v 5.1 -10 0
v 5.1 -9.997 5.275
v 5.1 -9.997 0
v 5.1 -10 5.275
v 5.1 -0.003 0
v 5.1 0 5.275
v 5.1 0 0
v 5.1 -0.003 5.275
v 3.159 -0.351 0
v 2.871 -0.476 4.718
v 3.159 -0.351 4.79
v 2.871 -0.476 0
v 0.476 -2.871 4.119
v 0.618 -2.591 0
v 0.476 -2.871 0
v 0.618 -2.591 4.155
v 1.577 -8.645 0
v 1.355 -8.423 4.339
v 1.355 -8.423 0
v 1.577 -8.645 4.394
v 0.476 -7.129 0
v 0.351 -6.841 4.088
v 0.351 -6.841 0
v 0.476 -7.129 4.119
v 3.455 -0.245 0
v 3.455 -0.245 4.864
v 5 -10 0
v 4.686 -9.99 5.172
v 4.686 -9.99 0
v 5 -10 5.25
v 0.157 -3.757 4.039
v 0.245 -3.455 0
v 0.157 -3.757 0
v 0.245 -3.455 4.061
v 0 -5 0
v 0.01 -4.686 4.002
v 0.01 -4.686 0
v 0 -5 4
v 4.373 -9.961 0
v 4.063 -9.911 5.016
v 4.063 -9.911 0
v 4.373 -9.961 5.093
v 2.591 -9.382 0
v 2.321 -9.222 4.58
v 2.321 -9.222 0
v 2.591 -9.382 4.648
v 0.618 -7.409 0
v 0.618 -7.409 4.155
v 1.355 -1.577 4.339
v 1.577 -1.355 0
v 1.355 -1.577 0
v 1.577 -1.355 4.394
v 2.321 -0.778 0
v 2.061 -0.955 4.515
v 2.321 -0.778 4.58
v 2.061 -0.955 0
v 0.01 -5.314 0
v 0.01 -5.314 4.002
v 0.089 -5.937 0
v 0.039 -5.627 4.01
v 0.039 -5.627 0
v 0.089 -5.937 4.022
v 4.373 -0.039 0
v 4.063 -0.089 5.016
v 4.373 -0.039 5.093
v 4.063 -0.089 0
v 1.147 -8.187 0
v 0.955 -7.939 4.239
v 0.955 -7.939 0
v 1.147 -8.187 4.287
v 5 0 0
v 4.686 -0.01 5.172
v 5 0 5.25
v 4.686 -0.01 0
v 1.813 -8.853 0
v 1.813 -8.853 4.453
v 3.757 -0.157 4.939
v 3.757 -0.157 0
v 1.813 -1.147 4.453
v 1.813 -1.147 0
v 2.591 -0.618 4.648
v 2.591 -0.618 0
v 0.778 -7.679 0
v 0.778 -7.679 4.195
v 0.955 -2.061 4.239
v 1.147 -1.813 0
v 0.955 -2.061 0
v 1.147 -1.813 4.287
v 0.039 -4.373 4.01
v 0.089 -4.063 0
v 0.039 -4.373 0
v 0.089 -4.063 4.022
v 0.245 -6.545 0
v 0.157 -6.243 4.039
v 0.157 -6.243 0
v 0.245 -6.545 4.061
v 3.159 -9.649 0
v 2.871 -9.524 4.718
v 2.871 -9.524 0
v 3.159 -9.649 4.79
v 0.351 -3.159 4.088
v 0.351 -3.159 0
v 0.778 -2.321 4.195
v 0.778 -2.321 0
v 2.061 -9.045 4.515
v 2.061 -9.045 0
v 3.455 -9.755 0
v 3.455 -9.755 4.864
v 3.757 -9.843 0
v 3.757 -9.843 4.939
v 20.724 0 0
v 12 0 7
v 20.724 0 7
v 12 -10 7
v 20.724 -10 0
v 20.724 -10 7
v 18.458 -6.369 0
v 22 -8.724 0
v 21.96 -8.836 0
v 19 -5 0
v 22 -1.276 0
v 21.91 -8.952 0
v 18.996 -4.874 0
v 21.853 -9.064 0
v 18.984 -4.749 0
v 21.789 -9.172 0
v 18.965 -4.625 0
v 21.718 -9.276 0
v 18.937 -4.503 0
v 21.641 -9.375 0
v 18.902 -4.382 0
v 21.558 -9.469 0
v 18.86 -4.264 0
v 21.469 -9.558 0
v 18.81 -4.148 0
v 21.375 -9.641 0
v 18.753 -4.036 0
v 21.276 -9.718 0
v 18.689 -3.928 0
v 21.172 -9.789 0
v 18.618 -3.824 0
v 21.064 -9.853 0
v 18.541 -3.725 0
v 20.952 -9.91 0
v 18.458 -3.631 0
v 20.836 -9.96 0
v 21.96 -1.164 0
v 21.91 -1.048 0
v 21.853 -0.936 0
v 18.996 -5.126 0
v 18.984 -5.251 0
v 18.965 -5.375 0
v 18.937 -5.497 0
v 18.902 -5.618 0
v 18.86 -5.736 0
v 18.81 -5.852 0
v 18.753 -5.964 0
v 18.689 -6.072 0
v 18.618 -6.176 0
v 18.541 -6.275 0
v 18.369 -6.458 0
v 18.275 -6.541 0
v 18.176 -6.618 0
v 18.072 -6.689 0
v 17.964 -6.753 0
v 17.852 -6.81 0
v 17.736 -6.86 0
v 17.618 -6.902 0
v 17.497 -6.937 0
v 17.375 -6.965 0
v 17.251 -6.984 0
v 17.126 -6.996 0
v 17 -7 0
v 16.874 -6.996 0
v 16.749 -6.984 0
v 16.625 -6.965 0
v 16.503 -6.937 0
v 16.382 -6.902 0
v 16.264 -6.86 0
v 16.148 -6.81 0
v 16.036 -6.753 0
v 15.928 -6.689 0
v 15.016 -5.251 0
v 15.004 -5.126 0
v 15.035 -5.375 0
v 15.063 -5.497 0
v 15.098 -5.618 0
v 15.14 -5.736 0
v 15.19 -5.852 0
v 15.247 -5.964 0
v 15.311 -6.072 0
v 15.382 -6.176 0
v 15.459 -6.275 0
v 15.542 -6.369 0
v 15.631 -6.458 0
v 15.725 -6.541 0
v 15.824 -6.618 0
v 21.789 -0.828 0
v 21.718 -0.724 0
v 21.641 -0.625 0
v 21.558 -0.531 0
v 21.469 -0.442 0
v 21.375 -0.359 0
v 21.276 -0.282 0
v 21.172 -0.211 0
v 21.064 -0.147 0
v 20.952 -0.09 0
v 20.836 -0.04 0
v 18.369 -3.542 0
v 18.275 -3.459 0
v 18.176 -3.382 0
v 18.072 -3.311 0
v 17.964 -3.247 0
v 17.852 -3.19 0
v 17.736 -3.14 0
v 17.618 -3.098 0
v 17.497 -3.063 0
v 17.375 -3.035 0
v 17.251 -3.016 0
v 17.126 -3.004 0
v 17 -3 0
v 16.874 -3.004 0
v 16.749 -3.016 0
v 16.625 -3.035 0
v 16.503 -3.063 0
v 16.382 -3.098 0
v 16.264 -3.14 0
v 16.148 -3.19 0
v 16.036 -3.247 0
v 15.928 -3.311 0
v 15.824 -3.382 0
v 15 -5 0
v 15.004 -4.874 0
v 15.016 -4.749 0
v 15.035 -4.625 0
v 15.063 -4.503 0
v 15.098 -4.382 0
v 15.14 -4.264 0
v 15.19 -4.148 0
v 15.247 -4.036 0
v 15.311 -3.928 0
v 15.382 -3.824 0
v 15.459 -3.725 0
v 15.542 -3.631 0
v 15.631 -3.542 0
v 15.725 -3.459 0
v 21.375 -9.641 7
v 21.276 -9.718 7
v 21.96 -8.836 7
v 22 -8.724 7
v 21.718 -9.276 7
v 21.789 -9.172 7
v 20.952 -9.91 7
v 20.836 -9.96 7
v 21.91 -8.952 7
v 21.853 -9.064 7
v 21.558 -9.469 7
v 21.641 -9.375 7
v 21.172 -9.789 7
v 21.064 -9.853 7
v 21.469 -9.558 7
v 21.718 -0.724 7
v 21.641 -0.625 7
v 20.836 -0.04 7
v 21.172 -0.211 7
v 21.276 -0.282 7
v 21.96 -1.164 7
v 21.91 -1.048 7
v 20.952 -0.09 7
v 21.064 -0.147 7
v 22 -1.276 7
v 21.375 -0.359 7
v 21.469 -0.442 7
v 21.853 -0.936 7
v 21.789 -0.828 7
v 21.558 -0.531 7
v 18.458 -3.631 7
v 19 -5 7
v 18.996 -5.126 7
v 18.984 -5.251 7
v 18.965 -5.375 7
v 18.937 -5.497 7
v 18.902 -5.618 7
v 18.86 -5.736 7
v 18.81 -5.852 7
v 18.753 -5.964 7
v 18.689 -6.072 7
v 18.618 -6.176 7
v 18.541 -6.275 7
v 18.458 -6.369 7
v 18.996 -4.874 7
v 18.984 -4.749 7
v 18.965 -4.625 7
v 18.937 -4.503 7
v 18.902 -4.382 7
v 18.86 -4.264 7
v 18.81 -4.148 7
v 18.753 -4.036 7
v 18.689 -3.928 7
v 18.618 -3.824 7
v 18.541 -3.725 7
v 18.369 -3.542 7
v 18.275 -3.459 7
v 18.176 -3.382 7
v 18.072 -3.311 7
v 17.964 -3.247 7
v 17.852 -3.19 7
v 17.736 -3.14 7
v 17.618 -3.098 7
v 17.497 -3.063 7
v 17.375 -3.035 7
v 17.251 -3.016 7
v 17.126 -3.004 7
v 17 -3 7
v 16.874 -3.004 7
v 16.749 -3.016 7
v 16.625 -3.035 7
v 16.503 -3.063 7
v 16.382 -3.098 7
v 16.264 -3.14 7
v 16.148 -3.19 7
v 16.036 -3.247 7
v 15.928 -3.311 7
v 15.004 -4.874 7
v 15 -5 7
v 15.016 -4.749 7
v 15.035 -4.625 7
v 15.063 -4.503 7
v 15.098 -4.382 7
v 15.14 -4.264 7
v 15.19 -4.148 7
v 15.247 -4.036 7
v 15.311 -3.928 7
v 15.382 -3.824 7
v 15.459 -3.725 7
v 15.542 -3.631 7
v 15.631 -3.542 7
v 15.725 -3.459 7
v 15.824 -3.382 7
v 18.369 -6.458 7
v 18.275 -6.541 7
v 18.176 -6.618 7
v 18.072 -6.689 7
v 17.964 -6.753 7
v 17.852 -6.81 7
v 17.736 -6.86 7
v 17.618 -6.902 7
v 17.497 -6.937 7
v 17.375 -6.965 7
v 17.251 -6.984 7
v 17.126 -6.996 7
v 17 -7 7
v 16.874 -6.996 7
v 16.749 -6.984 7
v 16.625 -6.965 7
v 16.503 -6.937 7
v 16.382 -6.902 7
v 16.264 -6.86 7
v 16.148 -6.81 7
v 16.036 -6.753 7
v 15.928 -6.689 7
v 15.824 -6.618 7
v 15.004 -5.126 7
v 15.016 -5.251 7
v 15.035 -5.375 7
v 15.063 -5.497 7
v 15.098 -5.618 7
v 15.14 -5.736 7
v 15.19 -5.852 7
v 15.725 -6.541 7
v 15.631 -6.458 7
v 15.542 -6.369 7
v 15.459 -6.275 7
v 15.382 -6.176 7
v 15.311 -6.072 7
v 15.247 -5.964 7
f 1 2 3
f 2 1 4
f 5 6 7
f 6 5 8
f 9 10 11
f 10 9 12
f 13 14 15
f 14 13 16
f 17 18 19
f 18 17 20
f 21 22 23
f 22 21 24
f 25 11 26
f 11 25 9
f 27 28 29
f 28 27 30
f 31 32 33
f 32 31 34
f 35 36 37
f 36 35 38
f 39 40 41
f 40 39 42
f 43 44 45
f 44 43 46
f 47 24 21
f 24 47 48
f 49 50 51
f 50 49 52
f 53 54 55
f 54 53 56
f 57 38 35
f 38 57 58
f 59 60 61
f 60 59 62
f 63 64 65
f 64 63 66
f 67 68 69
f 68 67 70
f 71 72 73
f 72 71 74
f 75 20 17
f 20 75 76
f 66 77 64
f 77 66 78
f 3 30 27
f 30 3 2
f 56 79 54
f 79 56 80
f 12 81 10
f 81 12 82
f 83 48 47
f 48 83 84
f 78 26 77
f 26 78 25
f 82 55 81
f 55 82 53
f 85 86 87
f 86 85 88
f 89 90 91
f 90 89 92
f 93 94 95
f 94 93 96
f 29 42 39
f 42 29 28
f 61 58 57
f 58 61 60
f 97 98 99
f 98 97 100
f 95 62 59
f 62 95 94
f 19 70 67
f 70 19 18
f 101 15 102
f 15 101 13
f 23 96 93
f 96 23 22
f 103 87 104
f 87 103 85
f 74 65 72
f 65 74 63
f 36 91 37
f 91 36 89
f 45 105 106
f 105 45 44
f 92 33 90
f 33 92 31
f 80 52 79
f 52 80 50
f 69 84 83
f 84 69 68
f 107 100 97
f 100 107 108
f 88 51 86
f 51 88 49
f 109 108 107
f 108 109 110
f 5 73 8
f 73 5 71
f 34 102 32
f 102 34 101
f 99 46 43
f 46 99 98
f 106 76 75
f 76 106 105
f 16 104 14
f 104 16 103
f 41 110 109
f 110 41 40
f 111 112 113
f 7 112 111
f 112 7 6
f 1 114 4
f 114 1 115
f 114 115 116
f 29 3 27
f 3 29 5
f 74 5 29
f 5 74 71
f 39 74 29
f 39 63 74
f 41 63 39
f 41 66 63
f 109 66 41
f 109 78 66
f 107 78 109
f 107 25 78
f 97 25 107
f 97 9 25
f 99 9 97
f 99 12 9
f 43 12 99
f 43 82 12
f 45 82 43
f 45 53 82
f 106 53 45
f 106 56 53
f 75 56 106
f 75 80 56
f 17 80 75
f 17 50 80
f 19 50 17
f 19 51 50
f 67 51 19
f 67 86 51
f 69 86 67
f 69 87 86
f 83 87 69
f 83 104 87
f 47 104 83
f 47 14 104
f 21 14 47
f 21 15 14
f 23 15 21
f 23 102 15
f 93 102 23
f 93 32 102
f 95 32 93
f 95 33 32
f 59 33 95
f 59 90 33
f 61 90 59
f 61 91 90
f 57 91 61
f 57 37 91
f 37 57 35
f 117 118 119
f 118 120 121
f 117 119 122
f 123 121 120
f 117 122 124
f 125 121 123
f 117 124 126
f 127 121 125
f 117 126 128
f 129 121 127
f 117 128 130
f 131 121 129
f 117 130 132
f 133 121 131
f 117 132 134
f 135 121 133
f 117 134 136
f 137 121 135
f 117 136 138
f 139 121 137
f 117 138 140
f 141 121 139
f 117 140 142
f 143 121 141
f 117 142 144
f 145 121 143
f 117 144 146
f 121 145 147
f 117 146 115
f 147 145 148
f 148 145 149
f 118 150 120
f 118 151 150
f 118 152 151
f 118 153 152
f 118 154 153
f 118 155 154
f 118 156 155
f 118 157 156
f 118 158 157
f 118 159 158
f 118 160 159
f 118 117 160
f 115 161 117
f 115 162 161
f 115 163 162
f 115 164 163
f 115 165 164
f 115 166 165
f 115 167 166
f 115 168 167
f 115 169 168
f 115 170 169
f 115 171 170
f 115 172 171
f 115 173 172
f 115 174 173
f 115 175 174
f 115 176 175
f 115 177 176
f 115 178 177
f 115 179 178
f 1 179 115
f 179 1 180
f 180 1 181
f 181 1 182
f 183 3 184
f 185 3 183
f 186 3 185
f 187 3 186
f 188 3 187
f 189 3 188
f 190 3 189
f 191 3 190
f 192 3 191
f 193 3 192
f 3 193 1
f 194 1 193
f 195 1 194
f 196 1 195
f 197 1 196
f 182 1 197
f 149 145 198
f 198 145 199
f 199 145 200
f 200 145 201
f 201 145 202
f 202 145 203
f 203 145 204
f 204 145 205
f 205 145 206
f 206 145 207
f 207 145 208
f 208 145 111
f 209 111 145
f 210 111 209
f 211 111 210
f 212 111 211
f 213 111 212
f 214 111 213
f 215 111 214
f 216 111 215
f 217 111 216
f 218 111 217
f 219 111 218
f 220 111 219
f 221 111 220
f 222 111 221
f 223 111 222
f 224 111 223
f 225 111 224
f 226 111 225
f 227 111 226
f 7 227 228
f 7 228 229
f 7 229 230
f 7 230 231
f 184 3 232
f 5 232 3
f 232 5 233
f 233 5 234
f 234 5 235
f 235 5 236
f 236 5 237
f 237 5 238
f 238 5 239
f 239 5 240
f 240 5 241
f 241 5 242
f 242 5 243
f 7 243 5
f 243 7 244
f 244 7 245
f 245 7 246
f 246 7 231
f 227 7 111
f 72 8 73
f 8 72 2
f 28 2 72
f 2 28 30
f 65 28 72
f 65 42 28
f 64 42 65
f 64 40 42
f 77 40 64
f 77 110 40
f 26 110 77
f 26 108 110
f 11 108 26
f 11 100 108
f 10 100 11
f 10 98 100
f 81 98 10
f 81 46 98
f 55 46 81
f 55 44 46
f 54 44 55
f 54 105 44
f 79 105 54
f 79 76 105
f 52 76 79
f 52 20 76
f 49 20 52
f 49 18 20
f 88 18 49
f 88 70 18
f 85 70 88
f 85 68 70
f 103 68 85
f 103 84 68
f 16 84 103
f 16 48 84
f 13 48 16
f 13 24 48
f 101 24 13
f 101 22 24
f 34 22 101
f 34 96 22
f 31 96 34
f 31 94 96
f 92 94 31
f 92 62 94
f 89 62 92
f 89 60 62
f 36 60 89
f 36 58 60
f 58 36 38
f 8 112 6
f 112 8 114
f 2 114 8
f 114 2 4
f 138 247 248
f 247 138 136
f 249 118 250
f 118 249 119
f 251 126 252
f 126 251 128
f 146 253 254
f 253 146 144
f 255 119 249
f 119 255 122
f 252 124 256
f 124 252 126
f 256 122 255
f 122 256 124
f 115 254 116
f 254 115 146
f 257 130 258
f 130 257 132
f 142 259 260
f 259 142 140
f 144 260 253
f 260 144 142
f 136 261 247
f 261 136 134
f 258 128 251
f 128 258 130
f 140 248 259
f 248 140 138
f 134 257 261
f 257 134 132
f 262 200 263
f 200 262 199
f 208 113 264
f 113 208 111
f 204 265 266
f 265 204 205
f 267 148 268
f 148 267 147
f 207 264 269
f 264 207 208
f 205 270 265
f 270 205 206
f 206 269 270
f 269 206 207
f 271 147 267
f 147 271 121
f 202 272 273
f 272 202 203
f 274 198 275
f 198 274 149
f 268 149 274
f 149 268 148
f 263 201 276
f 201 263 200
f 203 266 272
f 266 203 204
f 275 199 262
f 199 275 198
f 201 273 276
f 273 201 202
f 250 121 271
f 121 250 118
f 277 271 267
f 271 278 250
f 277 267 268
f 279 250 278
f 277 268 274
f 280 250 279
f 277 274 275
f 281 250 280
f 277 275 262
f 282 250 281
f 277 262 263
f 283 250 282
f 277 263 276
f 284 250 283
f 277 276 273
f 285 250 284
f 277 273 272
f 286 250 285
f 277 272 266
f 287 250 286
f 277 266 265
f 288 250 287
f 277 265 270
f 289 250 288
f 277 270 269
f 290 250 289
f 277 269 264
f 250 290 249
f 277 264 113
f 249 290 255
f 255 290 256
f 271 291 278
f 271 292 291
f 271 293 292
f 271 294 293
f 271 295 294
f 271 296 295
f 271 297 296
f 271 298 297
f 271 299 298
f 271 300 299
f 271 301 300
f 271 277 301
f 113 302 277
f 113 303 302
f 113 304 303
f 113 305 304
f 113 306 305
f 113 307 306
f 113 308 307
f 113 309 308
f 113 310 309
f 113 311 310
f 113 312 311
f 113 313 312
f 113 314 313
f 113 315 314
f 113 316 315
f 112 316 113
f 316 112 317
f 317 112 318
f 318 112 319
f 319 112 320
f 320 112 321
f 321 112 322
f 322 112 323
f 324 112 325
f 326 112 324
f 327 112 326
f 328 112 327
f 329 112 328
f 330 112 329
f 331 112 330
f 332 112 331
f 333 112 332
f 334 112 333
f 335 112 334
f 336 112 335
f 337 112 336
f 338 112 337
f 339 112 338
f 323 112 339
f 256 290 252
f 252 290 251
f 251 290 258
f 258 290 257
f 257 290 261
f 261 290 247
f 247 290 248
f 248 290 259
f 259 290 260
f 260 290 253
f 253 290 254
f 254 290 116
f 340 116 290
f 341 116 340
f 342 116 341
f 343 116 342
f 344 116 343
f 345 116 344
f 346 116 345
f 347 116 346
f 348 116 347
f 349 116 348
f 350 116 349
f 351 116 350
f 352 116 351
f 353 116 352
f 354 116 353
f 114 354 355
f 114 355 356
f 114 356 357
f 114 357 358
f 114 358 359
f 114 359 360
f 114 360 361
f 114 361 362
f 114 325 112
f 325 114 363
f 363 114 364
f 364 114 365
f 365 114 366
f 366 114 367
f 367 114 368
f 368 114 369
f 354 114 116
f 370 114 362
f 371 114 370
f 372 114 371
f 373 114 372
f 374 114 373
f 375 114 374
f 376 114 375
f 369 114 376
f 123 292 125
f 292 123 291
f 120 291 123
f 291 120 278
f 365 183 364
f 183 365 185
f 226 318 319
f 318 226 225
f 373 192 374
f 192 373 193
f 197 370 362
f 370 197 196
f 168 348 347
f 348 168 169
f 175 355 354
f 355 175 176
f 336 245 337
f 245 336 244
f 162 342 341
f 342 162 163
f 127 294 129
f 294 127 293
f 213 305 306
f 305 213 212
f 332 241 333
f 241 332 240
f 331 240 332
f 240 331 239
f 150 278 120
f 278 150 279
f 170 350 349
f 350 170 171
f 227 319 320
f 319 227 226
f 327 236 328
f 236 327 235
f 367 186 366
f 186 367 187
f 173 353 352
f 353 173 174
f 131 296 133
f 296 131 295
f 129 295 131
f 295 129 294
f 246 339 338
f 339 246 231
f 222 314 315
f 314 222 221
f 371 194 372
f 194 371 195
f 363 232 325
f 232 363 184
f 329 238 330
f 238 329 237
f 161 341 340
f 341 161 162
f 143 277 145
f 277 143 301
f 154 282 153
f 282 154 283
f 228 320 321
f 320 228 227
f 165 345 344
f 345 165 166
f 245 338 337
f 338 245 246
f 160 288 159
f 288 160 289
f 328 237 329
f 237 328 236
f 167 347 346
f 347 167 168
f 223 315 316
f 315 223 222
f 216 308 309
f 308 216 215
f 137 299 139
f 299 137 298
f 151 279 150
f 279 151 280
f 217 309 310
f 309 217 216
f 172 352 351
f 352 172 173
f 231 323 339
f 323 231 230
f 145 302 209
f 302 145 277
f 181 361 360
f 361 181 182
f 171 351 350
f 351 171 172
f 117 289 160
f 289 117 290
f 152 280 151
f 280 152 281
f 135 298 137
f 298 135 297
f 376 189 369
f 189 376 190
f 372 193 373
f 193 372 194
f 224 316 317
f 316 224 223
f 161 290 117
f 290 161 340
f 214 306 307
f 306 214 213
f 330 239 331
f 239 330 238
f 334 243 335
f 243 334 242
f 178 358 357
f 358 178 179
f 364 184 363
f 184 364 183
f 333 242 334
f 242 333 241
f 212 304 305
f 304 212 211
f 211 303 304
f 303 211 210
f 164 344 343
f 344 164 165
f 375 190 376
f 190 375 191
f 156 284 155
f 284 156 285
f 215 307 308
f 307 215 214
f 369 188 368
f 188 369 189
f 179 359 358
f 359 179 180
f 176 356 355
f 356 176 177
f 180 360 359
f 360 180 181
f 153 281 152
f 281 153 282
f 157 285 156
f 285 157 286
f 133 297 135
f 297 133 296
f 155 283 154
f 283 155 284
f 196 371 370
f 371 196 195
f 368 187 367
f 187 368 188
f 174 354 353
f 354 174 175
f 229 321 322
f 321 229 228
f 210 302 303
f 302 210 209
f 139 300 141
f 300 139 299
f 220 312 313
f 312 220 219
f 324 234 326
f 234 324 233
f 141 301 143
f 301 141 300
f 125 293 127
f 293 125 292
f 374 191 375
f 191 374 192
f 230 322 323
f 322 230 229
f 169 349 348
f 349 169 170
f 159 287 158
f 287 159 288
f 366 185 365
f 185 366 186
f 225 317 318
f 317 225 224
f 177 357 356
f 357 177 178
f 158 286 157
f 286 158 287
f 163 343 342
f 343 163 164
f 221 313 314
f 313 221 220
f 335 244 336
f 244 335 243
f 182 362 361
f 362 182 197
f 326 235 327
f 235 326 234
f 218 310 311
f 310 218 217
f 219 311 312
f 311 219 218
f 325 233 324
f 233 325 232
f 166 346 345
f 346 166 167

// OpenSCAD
// file: functions.scad
/**********************************
	File: functions.scad
	Revision: 0.1 (10/7/2012)
	OpenSCAD version by:
	Michael Williams (gannon)
	mswillia@mtu.edu
**********************************/
include <config.scad>

//Drill a hole the given depth at the given location
module drill(x,y,radius,depth) {
	translate([x,y,-overdrill])
		cylinder(r=radius,h=depth,$fn=100);
}

module roundedcorner(radius,thickness,angle) {
	rotate([0,0,angle])
		translate([-radius+overdrill,-radius+overdrill,-overdrill])
			difference() {
				translate([-overdrill,-overdrill,0])
					cube([radius+overdrill,radius+overdrill,thickness+overdrill*2]);
				cylinder(r=radius,h=thickness+overdrill*2, $fn=100);
			}
}

//Usage: points is an array consisting of elements
//[x,y,r] for each point of the polygon
//Please note that x and y will be the centers
//of the rounded edges! Outside wall will be
//r away at some angle.
//Ideally I will make a function that will find
//the place to put the circle of a given radius
//based off of the points in the polygon.
module multiradiusroundedpoly(points,height) {
	linear_extrude(height=height)
		hull()
			for (p = points) {
				translate([p[0],p[1],0])
					circle(r=p[2],$fn=100);
			}
}
// file: config.scad
/**********************************
	File: config.scad
	Revision: 0.2 (1/5/2013)
	OpenSCAD version by:
	Michael Williams (gannon)
	mswillia@mtu.edu
**********************************/

/**********************************
		CONFIGURATION
**********************************/
//This is for the depth of holes so OpenSCAD renders correctly.
overdrill=0.1;

//LM10UU
linear_bearing_length=29;
linear_bearing_ID=10;
linear_bearing_OD=19.4;//19

//HFSB5-2020 extrusions
extrusion_height=20;
extrusion_width=20;
extrusion_wall=3.2;
extrusion_opening=5.4;

//Large rods
smooth_rod_diameter=10;
threaded_rod_diameter=8;

//608zz
skate_bearings_length=7;
skate_bearings_ID=8;
skate_bearings_OD=22;

//Belt configuration
belt_width=8;
belt_depth=1;

/*
3/8"-12 acme rod
m8 threaded rod
*/

spring_OD=6;

screw_a_diameter=3;
screw_b_diameter=4;
screw_c_diameter=5;
screw_d_diameter=8;

/**********************************
		END CONFIGURATION
**********************************/
// main file
/**********************************
	File: GlassFinger.scad
	Revision: 0.1(2/2/2013)
	OpenSCAD version by:
	Michael Williams (gannon)
	mswillia@mtu.edu
**********************************/
include <config.scad>
use <functions.scad>
/**********************************
		CONFIGURATION
**********************************/
width = 10;
height = 10;
/**********************************
		END CONFIGURATION
**********************************/
union() {
	difference() {
		rotate([90,0,0])
			linear_extrude(height = 10)
				polygon(points=[[0,0],
								[0,4],
								[12,7],
								[12,0]],paths=[[0,1,2,3]]);
		difference() {
			translate([-overdrill,-width-overdrill,-overdrill])
				cube([width/2+overdrill*2,width+overdrill*2,height]);
			translate([width/2,-width/2,-overdrill])
				cylinder(r=width/2,h=height+overdrill*2, $fn=100);
		}
	}
	translate([12,-10,0])
		difference() {
			cube([10,10,7]);
			drill(5,5,screw_b_diameter/2,7+overdrill*2);
			translate([10,0,0])
				roundedcorner(2,7,-90);
			translate([10,10,0])
				roundedcorner(2,7,0);
		}
}
